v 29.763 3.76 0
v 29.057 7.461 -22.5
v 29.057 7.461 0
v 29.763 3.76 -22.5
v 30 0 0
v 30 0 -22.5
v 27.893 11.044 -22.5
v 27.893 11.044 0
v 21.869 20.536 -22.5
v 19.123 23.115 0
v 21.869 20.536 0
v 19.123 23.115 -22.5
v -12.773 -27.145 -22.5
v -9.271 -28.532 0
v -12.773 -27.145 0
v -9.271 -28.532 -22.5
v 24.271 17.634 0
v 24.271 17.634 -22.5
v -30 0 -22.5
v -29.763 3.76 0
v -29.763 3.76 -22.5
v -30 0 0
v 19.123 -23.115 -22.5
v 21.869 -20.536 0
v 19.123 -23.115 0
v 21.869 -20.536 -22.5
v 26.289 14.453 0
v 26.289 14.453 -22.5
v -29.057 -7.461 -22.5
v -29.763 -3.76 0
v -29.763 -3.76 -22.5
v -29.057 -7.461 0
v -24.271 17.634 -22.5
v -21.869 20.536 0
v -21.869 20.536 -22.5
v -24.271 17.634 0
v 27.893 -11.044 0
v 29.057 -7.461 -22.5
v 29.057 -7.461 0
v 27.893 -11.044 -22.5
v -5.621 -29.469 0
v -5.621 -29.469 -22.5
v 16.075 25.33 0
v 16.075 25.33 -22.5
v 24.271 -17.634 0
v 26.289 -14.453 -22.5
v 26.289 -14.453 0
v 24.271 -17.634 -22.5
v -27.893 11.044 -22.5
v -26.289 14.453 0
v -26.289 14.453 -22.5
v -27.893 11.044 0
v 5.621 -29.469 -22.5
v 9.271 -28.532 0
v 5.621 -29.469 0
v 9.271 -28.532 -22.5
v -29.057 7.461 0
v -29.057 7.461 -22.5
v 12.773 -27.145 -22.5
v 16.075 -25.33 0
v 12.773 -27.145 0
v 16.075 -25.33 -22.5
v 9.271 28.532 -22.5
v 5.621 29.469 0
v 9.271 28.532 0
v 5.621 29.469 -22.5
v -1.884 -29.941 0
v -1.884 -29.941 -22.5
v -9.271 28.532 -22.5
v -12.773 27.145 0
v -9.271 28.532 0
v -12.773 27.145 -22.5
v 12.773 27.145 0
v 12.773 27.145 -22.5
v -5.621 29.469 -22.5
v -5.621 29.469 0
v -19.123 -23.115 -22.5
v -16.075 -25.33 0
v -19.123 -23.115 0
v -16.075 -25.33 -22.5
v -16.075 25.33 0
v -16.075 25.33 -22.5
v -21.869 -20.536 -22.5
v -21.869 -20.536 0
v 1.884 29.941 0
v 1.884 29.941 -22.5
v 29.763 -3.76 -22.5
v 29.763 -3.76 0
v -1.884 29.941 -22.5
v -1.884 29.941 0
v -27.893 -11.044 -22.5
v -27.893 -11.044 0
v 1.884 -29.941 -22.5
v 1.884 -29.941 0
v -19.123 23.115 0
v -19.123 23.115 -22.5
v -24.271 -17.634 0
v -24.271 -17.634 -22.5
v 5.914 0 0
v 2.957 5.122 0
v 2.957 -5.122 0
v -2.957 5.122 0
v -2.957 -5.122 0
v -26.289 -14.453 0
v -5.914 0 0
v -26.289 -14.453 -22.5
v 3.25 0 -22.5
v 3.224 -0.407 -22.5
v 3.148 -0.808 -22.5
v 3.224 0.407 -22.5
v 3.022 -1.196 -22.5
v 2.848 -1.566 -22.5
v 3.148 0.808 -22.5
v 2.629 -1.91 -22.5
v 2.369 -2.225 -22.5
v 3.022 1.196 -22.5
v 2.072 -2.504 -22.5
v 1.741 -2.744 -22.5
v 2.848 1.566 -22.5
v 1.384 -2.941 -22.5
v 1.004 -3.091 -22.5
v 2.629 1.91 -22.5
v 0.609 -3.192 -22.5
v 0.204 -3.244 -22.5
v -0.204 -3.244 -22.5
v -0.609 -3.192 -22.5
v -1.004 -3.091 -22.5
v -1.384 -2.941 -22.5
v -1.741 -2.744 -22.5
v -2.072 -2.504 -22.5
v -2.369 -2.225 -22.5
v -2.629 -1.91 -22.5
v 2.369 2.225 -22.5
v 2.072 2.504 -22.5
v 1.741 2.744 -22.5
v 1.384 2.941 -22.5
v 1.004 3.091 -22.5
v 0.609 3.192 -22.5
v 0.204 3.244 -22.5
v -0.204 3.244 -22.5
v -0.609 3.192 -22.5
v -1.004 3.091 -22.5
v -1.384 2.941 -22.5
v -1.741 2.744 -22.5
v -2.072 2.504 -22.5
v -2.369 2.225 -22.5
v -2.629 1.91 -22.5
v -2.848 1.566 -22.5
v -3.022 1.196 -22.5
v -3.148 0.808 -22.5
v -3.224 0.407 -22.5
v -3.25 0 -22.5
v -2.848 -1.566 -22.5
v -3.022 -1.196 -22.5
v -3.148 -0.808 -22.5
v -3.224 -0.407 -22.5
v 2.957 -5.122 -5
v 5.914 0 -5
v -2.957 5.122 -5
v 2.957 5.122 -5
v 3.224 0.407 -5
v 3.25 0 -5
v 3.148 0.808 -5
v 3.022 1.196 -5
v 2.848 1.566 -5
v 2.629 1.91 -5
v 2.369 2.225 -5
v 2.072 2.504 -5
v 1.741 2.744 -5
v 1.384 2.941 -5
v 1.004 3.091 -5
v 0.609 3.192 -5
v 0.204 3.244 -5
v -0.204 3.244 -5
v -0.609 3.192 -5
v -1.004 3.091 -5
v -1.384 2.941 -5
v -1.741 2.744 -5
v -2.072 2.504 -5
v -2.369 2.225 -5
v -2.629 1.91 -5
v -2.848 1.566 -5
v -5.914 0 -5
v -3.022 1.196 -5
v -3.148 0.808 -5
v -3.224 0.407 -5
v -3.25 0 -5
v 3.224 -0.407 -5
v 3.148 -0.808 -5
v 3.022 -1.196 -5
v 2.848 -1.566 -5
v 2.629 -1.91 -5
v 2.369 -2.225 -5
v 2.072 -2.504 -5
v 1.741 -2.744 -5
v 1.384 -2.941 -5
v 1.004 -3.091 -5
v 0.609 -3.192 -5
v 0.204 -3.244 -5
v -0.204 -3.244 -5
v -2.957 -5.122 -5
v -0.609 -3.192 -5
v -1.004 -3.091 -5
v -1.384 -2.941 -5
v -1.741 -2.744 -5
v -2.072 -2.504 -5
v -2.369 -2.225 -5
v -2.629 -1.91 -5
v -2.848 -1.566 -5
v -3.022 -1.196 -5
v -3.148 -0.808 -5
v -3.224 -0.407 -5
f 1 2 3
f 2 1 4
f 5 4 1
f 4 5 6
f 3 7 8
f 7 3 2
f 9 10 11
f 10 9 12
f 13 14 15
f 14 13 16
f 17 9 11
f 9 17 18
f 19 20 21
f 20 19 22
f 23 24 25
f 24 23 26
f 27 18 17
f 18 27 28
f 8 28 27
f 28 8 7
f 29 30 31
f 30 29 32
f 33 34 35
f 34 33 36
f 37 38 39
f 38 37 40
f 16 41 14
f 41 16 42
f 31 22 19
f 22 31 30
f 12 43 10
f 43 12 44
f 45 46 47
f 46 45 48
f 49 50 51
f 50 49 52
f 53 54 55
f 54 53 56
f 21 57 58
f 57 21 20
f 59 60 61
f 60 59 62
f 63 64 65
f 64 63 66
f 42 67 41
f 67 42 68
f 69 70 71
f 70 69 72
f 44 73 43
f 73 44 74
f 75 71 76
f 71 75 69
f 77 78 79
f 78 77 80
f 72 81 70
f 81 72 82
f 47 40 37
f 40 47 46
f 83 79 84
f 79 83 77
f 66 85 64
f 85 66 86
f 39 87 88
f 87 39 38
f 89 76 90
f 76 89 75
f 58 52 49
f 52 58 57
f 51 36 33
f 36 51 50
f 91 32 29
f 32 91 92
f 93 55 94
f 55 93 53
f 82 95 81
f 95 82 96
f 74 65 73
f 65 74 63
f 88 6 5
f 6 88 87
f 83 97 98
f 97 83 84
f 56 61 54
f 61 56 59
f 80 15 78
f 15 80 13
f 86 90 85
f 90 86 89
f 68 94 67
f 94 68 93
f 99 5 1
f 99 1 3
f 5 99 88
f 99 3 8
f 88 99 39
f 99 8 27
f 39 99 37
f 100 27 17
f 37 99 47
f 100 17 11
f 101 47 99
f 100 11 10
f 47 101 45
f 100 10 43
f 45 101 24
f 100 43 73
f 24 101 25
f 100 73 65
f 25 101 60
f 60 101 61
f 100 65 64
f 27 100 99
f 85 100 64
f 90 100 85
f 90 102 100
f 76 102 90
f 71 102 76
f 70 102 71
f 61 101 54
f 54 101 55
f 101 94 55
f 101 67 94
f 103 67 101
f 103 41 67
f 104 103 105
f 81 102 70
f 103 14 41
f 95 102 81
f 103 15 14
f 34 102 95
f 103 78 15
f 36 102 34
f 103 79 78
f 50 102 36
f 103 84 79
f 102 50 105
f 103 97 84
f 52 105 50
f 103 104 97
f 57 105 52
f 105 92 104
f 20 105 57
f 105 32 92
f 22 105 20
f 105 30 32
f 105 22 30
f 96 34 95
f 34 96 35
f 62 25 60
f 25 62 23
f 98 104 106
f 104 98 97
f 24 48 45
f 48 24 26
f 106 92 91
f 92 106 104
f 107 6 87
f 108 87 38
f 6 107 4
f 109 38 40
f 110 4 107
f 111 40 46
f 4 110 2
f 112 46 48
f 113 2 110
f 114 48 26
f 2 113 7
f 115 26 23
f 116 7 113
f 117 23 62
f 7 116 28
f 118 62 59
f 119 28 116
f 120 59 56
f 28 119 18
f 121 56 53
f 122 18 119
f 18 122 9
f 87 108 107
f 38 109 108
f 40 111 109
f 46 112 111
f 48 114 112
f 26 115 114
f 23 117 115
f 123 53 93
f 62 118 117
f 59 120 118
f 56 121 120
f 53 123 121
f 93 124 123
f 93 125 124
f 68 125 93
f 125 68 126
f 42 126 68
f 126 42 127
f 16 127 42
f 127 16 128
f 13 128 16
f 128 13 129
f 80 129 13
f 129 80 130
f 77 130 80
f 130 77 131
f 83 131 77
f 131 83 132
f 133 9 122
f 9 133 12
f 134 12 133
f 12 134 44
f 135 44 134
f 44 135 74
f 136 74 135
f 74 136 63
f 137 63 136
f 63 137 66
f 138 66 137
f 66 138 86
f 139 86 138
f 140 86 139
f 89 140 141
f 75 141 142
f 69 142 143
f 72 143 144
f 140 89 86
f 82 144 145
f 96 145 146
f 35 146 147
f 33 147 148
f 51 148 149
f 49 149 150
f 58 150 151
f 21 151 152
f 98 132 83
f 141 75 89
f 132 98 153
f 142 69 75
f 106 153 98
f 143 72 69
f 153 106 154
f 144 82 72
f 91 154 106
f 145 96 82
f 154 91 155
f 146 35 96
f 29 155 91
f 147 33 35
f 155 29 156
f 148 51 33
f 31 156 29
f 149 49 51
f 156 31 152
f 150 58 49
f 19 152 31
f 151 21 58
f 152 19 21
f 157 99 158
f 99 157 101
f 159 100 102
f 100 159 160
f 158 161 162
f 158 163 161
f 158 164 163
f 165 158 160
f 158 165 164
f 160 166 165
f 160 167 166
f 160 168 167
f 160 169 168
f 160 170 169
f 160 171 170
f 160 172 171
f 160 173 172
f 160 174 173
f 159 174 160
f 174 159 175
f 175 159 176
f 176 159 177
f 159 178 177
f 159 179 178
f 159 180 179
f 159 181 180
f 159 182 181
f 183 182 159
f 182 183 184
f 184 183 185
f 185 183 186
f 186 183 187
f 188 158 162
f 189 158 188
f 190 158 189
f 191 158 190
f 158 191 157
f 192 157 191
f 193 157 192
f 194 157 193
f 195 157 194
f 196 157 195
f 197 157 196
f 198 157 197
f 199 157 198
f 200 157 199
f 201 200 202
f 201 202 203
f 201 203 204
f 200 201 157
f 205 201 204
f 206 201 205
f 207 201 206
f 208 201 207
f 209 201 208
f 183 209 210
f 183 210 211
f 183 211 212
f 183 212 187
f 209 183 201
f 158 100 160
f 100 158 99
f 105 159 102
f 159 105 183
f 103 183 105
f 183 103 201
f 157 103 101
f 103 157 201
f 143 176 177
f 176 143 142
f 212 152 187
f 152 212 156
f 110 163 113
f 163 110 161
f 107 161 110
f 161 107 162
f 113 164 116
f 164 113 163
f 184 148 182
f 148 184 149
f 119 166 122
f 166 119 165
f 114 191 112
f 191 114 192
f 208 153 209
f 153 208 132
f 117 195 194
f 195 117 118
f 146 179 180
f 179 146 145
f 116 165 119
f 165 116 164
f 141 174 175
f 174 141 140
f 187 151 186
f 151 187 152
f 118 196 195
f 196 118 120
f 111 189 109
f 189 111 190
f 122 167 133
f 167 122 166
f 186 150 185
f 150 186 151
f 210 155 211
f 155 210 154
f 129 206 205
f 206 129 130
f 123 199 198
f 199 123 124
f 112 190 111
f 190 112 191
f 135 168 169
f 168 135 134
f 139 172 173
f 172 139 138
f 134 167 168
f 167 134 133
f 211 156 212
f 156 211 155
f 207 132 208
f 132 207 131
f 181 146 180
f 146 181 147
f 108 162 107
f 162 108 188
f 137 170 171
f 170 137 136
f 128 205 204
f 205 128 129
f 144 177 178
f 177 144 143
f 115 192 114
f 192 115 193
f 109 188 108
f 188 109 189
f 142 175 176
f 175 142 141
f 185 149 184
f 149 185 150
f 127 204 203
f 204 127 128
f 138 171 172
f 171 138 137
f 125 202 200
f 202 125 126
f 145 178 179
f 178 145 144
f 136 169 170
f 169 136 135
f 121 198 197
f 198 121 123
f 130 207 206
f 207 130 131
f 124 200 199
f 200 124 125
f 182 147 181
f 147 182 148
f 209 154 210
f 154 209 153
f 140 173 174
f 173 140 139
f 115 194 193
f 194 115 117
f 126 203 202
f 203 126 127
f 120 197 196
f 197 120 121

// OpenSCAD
$fn = 50;

difference() {
	union() {
		translate(v = [0, 0, -22.5]) {
			cylinder(h = 22.5, r = 30.0);
		}
		#translate(v = [0, 0, -24.0]) {
			cylinder(h = 24, r = 2.875);
		}
	}
	union() {
		translate(v = [0, 0, 0]) {
			rotate(a = [0, 0, 0]) {
				difference() {
					union() {
						translate(v = [0, 0, -5]) {
							linear_extrude(height = 5) {
								polygon(points = [[5.914249999999999, 0.0], [2.957125, 5.1218907443321156], [-2.9571249999999982, 5.1218907443321156], [-5.914249999999999, 7.242867331857232e-16], [-2.9571250000000022, -5.121890744332115], [2.9571249999999956, -5.121890744332118]]);
							}
						}
					}
					union();
				}
			}
		}
		#translate(v = [0, 0, -100.0]) {
			cylinder(h = 200, r = 3.25);
		}
	}
}
